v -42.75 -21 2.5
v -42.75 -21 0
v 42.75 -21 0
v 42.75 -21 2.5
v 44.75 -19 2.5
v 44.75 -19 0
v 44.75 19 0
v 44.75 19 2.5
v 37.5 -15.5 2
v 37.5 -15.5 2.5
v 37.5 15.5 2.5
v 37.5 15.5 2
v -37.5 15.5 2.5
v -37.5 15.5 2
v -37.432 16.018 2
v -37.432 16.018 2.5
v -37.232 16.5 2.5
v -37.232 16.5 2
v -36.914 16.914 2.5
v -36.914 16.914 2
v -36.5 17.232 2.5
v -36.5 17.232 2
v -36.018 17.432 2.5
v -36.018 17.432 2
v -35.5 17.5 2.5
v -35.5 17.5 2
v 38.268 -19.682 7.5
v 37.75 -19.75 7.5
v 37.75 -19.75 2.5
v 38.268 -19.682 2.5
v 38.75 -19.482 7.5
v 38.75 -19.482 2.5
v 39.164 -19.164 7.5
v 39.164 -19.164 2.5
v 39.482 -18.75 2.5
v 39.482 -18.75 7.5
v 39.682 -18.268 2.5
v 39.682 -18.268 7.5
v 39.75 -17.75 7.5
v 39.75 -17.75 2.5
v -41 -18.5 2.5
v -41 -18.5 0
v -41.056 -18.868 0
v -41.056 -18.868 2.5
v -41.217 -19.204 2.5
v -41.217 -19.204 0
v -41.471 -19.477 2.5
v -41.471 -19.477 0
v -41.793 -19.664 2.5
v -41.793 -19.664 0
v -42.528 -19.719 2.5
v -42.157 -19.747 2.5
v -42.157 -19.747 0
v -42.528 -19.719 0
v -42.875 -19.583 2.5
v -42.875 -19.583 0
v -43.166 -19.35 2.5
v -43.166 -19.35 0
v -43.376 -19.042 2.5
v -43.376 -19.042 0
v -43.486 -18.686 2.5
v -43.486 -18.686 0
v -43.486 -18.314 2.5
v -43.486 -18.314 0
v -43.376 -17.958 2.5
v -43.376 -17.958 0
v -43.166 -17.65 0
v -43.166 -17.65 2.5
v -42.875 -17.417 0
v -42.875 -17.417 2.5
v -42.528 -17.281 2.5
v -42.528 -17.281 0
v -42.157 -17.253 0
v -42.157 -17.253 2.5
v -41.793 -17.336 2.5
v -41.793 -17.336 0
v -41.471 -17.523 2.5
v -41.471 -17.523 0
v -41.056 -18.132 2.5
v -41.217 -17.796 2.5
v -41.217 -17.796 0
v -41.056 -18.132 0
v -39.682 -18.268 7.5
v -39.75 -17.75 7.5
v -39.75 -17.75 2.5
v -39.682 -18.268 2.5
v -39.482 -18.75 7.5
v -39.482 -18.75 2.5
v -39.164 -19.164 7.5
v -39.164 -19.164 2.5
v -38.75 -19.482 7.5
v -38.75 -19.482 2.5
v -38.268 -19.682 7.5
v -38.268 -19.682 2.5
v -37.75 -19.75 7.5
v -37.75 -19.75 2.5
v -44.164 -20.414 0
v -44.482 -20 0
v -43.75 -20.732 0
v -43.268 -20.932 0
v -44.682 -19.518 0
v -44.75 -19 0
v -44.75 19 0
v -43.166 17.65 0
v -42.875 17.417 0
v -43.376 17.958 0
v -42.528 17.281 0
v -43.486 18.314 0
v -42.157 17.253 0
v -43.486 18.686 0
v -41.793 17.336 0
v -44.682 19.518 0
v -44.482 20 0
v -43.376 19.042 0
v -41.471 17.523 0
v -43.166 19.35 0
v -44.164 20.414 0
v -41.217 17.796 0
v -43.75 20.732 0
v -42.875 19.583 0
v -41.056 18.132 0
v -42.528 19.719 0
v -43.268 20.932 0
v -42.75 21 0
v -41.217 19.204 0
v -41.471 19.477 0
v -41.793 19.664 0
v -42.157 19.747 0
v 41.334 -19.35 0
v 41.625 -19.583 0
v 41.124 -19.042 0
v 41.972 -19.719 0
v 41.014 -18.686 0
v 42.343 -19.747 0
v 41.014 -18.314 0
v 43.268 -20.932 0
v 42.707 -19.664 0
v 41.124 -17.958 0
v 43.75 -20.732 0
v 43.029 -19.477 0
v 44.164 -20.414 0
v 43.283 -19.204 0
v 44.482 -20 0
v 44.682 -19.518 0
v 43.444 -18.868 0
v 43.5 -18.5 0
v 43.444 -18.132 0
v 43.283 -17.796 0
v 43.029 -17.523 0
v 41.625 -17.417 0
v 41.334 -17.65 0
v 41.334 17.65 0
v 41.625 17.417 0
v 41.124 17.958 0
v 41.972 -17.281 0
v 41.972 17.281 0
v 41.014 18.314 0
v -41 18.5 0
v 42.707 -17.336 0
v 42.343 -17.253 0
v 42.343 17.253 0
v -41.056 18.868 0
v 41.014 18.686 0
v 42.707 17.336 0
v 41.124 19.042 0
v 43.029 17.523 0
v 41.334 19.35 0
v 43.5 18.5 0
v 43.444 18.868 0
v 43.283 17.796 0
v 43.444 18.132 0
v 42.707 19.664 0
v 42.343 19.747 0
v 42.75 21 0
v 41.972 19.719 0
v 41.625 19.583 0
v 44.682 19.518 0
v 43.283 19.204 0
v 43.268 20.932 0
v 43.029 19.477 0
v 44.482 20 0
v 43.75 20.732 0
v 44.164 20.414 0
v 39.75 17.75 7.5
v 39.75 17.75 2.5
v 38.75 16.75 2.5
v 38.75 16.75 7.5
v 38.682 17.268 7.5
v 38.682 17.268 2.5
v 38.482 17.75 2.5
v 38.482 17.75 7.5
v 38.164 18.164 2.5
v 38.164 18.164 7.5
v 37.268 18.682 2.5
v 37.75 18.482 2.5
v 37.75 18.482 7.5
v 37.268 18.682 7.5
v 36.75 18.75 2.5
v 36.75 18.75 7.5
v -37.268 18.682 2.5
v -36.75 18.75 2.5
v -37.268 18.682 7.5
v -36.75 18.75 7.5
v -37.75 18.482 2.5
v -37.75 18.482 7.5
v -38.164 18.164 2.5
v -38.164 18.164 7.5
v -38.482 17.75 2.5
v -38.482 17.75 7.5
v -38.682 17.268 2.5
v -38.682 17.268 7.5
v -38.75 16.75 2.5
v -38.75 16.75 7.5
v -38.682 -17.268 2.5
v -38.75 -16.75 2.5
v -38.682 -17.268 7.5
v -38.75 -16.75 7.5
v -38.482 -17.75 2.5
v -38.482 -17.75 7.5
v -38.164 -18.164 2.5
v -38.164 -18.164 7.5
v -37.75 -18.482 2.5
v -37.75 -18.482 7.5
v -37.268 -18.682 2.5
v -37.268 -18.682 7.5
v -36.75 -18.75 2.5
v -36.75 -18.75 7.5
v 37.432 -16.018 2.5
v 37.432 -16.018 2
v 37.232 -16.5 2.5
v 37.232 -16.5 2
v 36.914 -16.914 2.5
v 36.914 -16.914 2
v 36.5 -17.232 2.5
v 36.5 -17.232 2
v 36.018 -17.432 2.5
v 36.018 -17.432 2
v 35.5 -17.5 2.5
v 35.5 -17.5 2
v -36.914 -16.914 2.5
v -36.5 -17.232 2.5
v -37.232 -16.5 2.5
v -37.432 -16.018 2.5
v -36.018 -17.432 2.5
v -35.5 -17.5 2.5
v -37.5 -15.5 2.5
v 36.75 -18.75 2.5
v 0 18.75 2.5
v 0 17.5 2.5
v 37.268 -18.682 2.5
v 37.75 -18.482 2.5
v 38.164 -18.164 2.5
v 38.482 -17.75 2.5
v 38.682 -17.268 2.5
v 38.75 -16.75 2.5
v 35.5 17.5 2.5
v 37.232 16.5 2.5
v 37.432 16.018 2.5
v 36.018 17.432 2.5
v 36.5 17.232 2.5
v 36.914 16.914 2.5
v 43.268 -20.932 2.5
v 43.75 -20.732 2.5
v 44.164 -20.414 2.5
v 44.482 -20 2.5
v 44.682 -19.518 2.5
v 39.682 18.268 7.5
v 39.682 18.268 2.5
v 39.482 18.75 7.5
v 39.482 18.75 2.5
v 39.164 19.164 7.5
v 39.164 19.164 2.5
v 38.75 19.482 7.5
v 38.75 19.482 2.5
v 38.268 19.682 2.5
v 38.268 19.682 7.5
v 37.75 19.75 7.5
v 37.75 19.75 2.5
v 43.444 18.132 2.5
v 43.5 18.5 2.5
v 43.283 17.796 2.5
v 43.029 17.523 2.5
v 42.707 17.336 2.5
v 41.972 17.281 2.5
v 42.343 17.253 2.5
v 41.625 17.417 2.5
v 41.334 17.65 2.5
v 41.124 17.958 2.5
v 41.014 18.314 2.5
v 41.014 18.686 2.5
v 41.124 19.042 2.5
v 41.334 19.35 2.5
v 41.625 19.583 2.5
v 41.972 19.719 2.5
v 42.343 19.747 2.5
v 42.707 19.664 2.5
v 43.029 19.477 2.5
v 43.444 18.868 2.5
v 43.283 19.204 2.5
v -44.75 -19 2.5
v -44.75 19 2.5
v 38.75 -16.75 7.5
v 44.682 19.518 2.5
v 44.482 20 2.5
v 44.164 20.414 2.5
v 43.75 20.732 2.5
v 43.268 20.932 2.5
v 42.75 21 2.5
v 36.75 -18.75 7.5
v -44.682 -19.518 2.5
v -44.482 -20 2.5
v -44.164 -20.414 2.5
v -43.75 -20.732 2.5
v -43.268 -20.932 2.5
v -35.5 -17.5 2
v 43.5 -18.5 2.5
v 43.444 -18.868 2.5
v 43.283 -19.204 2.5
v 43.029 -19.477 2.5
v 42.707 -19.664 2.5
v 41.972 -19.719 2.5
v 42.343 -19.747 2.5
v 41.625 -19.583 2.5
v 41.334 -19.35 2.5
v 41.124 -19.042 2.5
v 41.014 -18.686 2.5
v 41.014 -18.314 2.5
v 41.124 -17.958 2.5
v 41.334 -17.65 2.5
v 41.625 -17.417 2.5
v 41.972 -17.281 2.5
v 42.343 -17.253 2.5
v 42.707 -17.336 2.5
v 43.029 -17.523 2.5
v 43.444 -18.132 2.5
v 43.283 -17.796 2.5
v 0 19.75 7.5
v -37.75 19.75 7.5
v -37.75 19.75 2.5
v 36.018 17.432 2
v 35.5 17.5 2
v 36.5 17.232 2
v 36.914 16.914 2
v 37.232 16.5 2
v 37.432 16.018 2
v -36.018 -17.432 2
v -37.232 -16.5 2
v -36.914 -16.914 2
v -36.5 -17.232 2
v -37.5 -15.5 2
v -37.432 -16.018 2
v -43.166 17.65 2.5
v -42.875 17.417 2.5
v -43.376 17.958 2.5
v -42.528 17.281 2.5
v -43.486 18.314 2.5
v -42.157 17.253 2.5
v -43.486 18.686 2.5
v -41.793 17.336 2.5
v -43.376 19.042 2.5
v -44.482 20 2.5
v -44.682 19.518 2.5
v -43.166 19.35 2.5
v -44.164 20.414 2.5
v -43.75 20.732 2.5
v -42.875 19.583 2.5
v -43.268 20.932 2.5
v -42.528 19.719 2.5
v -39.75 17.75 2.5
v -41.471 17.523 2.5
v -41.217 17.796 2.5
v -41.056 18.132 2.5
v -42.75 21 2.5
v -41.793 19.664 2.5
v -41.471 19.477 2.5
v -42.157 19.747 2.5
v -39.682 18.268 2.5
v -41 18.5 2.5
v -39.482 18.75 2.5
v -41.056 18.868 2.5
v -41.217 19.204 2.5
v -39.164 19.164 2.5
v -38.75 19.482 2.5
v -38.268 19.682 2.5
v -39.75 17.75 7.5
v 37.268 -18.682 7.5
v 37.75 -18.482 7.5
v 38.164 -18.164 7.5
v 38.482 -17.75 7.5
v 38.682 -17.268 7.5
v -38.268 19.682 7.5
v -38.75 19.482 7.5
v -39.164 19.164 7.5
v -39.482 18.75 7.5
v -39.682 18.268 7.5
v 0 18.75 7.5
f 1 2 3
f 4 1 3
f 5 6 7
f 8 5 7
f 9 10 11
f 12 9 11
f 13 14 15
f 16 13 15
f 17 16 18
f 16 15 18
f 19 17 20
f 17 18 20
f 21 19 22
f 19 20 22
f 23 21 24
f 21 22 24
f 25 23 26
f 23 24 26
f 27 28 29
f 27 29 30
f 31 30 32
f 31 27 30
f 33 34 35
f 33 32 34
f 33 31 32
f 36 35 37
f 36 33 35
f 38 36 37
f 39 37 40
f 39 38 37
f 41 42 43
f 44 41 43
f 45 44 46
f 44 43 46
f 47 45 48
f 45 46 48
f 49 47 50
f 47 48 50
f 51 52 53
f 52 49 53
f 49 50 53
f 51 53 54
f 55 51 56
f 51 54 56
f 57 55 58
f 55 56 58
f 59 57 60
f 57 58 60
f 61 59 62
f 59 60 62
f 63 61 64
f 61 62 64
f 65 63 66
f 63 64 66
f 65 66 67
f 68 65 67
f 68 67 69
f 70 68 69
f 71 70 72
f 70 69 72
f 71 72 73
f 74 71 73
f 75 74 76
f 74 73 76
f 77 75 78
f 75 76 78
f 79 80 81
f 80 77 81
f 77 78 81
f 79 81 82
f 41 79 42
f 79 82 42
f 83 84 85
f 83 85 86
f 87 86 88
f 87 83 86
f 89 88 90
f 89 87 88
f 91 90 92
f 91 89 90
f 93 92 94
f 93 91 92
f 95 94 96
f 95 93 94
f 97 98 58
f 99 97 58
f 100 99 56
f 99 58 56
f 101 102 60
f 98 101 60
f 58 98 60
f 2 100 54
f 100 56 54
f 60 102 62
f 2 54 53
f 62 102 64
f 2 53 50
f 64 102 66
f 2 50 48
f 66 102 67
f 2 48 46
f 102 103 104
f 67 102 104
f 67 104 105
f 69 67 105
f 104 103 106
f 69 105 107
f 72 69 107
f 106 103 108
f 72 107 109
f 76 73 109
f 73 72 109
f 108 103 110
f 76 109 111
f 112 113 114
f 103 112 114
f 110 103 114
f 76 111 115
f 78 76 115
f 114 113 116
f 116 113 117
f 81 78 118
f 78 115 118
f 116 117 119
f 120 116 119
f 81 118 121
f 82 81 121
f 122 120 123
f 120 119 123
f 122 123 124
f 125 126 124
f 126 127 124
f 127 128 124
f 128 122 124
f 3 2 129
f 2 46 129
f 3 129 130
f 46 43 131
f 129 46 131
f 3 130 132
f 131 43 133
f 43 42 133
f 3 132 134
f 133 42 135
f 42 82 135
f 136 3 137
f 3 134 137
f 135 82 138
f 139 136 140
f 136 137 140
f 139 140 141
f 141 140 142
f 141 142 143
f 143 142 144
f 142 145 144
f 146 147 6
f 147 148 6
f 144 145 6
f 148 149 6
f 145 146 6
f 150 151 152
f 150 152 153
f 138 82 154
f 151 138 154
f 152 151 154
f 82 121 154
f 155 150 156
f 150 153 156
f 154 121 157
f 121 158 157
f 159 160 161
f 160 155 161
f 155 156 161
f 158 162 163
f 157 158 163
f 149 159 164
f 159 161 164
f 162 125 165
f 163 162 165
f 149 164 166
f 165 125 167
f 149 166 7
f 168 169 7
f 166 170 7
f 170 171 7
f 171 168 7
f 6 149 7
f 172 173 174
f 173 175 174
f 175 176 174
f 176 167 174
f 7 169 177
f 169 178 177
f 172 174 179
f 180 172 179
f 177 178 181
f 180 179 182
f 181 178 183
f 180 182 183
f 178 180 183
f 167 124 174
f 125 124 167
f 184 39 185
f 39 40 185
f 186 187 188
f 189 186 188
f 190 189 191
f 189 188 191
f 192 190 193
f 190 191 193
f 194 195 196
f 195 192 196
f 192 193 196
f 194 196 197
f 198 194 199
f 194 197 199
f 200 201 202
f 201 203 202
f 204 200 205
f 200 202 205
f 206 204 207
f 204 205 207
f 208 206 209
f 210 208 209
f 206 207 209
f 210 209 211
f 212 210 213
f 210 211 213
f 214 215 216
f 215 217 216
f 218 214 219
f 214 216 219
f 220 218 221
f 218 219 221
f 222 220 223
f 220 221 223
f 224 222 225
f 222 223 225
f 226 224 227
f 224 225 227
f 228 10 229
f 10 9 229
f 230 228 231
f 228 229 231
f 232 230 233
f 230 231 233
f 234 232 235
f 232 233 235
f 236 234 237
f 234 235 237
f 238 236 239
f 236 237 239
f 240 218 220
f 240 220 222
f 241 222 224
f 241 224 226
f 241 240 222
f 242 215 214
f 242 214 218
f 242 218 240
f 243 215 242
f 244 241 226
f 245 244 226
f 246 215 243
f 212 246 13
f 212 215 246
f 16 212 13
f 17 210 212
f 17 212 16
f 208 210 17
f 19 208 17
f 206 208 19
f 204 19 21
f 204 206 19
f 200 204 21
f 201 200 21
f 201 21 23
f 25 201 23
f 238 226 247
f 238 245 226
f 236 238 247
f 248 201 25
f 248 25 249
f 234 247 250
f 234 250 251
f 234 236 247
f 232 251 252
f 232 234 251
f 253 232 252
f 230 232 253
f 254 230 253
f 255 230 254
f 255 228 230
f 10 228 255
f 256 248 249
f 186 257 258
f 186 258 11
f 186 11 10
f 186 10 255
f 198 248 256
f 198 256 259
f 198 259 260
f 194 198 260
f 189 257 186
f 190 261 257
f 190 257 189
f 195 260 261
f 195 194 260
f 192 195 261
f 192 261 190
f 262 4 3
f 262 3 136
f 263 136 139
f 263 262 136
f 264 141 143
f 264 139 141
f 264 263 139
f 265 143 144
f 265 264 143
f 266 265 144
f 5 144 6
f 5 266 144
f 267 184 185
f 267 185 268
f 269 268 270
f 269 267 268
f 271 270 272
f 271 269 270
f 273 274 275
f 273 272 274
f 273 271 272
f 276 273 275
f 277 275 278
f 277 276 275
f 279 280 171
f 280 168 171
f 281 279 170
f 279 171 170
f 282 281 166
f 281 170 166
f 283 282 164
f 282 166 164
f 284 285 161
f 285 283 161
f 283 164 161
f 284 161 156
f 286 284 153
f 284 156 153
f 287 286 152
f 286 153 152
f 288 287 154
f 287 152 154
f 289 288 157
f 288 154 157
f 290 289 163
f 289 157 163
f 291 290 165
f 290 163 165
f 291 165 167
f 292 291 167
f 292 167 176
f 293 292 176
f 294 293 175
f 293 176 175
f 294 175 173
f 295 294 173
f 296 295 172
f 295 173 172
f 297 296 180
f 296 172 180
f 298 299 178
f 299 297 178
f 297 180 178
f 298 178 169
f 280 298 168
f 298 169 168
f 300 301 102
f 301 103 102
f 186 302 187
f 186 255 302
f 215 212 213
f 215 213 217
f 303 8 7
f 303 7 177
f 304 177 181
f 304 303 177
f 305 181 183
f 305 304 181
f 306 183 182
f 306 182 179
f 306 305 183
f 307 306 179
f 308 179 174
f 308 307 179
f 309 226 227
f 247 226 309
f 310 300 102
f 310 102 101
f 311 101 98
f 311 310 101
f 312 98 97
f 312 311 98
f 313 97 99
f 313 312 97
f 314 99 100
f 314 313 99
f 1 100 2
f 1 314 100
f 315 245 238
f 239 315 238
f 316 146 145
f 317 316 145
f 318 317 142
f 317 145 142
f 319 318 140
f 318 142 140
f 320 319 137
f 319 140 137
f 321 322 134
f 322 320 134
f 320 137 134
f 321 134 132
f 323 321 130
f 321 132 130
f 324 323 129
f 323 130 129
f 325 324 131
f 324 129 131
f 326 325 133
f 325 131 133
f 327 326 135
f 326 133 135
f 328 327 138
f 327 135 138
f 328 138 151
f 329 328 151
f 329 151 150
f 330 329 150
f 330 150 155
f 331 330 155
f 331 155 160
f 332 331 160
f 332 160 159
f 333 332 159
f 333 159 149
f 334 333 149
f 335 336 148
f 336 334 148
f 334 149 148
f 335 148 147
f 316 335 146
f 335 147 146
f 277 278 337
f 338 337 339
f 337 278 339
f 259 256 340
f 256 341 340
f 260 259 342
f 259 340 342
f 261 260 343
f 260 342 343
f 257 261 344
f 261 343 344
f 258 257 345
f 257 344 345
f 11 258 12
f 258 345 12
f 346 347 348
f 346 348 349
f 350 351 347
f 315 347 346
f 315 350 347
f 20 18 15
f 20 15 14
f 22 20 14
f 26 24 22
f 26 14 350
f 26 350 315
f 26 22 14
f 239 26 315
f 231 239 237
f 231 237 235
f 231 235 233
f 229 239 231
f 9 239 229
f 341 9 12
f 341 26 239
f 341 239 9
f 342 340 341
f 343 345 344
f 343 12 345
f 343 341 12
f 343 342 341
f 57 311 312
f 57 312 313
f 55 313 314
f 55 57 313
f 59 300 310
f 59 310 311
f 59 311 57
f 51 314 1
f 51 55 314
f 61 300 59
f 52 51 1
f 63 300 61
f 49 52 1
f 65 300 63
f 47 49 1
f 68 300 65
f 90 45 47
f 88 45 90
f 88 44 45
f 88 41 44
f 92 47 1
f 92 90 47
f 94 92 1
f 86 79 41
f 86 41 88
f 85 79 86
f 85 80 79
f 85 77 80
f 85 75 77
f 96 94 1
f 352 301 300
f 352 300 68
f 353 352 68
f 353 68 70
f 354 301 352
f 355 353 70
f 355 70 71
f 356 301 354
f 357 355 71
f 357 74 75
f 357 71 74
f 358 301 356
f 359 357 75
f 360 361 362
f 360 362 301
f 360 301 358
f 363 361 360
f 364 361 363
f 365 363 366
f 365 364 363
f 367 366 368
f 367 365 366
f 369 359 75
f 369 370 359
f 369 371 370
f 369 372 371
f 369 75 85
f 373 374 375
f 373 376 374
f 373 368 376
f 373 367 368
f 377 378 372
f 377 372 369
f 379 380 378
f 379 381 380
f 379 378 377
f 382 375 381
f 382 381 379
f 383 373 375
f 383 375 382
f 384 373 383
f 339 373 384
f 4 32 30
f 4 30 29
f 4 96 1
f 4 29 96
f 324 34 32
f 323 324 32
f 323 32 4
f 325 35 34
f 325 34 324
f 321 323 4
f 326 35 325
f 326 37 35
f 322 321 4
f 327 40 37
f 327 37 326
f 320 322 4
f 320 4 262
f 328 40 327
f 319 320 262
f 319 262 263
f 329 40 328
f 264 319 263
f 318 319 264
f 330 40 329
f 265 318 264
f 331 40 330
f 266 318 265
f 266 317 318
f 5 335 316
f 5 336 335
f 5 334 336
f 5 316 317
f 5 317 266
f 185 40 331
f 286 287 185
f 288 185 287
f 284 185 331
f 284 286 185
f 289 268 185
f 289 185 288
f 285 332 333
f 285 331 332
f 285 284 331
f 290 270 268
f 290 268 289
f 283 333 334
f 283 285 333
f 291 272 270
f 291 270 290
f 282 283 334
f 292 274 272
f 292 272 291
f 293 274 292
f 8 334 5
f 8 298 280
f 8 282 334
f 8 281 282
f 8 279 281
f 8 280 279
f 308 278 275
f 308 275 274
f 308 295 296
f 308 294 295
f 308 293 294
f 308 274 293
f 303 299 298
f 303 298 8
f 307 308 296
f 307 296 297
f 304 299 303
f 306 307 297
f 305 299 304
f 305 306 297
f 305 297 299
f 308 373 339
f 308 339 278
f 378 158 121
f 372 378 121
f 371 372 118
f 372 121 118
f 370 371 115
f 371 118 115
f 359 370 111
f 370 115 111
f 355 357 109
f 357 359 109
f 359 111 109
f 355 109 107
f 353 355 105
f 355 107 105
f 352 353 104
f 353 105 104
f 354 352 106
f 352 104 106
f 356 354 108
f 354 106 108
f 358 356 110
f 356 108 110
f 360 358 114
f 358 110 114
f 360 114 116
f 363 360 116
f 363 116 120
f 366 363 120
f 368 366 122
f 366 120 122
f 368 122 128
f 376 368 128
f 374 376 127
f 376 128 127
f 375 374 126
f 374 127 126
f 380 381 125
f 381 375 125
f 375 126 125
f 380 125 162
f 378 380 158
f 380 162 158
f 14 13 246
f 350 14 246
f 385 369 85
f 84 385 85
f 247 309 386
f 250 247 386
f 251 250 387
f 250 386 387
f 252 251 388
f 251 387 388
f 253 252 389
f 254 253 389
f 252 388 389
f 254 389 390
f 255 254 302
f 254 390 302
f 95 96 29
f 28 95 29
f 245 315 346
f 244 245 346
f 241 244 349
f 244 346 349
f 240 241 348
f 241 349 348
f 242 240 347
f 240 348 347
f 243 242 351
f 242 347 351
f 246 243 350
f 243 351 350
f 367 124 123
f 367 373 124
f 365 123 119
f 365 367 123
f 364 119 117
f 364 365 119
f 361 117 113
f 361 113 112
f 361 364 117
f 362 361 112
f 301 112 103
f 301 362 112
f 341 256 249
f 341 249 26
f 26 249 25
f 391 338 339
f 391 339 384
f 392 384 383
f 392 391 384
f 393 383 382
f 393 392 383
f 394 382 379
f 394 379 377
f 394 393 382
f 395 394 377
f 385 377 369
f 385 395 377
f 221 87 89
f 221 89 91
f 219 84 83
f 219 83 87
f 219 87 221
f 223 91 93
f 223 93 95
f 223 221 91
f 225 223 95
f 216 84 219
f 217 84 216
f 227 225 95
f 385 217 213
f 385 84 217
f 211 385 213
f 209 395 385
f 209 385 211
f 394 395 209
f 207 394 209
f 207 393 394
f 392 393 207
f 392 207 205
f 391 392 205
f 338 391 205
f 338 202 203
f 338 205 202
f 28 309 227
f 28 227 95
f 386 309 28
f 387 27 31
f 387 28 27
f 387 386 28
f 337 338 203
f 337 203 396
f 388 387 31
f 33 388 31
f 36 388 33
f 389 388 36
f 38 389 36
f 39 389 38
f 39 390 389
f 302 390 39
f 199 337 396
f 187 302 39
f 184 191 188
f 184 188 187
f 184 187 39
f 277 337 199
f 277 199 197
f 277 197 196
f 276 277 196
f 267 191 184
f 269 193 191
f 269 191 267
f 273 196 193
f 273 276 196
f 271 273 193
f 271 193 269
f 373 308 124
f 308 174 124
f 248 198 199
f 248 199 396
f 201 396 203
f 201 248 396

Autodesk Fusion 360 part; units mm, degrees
sketch "Sketch1" plane through (0, 0, 0) normal (0, 0, 1) x (1, 0, 0)
  line L0 (44.75, 21) -> (-44.75, 21)
  line L1 (-44.75, 21) -> (-44.75, -21)
  line L2 (-44.75, -21) -> (44.75, -21)
  line L3 (44.75, -21) -> (44.75, 21)
  line L4 (44.75, 21) -> (-44.75, -21) construction
  line L5 (-44.75, 21) -> (44.75, -21) construction
  circle A0 centre (-42.25, 18.5) radius 1.25
  line L6 (20, 0) -> (2.5, 0)
  circle A1 centre (-42.25, -18.5) radius 1.25
  line L7 (0, 2.5) -> (0, 20)
  circle A2 centre (42.25, -18.5) radius 1.25
  circle A3 centre (42.25, 18.5) radius 1.25
  line L8 (38.75, 18.75) -> (-38.75, 18.75)
  line L9 (-38.75, 18.75) -> (-38.75, -18.75)
  line L10 (-38.75, -18.75) -> (38.75, -18.75)
  line L11 (38.75, -18.75) -> (38.75, 18.75)
  line L12 (38.75, 18.75) -> (-38.75, -18.75) construction
  line L13 (-38.75, 18.75) -> (38.75, -18.75) construction
  line L14 (39.75, 19.75) -> (-39.75, 19.75)
  line L15 (-39.75, 19.75) -> (-39.75, -19.75)
  line L16 (-39.75, -19.75) -> (39.75, -19.75)
  line L17 (39.75, -19.75) -> (39.75, 19.75)
  line L18 (39.75, 19.75) -> (-39.75, -19.75) construction
  line L19 (-39.75, 19.75) -> (39.75, -19.75) construction
  line L20 (37.5, 17.5) -> (-37.5, 17.5)
  line L21 (-37.5, 17.5) -> (-37.5, -17.5)
  line L22 (-37.5, -17.5) -> (37.5, -17.5)
  line L23 (37.5, -17.5) -> (37.5, 17.5)
  line L24 (37.5, 17.5) -> (-37.5, -17.5) construction
  line L25 (-37.5, 17.5) -> (37.5, -17.5) construction
  dimension "d5" = 2.5
  dimension "d38" = 75
  dimension "d39" = 35
  dimension "d40" = 3.5
  dimension "d41" = 1.25
  dimension "d42" = 1.25
  dimension "d43" = 1.25
  dimension "d44" = 2.25
  dimension "d45" = 2.5
  dimension "d46" = 2.5
  dimension "d47" = 2.5
extrude "Extrude1" add sketch "Sketch1" along normal blind 2.5 contours L0 L1 L2 L3 | L8 L9 L10 L11 | L14 L15 L16 L17 | L20 L21 L22 L23
extrude "Extrude7" add sketch "Sketch1" along normal blind 5 from surface at 2.5 contours L14 L15 L16 L17
extrude "Extrude8" cut sketch "Sketch1" against normal blind 0.5 from surface at 2.5 contours L20 L21 L22 L23
fillet "Fillet3" radius 2 16 edges at (-39.75, -19.75, 5) (-44.75, -21, 1.25) (-38.75, -18.75, 5) (-37.5, -17.5, 2.25) (-37.5, 17.5, 2.25) (-38.75, 18.75, 5) (-39.75, 19.75, 5) (-44.75, 21, 1.25) (39.75, 19.75, 5) (44.75, 21, 1.25) (39.75, -19.75, 5) (44.75, -21, 1.25) (37.5, -17.5, 2.25) (38.75, -18.75, 5) (38.75, 18.75, 5) (37.5, 17.5, 2.25)
equation "d3 = 2.5 mm"
equation "d42 = d41"
equation "d43 = d41"
equation "d44 = d40 - d41"
equation "d45 = d41 + 0.5 * d5"
equation "d46 = d41 + 0.5 * d5"
equation "d47 = d41 + 0.5 * d5"
equation "d48 = d3"
equation "d51 = d3"
